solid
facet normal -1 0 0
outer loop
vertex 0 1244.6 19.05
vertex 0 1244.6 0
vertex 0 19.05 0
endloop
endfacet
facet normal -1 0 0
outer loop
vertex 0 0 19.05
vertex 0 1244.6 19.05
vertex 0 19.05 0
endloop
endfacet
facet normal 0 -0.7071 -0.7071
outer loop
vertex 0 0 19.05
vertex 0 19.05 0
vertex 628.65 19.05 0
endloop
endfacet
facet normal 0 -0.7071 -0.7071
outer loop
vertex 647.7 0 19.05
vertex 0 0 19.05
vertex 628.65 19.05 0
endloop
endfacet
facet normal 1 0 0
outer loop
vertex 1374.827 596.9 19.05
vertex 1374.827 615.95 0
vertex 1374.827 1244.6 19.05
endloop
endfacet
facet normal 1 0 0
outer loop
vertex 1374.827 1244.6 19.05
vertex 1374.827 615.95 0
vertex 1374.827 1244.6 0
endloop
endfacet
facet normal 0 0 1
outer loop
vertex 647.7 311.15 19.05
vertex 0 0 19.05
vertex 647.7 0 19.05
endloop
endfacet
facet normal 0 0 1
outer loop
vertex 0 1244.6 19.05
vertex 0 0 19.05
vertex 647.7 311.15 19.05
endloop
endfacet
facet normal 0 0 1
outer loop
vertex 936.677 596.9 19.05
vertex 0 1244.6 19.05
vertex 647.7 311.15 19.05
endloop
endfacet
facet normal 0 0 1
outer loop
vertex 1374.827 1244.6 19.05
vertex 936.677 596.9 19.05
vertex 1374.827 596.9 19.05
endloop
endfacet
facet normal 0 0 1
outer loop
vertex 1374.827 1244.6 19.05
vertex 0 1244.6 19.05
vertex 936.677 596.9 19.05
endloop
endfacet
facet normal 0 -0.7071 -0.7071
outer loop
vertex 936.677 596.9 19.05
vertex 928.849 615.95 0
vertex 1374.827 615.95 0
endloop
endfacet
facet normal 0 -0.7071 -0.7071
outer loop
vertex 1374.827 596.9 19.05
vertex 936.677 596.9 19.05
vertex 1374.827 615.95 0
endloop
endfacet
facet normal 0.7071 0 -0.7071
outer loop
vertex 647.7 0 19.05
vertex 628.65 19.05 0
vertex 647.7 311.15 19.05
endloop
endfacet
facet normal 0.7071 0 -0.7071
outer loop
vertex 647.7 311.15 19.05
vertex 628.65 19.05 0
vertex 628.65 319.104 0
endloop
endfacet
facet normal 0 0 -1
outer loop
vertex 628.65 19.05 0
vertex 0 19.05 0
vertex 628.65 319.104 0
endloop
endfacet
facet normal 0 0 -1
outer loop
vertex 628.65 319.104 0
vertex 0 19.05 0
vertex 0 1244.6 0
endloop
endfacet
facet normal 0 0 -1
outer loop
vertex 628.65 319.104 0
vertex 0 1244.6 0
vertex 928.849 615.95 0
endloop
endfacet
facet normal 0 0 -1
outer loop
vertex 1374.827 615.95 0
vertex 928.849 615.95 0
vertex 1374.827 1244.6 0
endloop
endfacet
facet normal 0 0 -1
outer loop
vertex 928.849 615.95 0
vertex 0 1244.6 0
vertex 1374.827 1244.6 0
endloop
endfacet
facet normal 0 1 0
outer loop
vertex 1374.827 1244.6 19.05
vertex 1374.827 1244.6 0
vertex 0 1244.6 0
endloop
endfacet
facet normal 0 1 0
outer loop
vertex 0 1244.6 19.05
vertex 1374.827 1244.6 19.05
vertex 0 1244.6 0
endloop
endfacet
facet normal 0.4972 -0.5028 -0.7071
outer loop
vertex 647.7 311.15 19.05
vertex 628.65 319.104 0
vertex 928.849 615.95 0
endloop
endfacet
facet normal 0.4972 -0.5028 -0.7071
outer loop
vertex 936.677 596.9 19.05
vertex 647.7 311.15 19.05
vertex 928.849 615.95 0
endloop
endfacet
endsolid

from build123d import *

# Parameters (mm, degrees)
F1_DEPTH = 19.05
F2_SIZE  = 19.04999


# Not quite as in the source:
# - a fillet or chamfer is up to 0.001 mm smaller than in the source, because OpenCascade refuses the exact size


with BuildPart() as f1:
    # F0 (on Top) → F1 (new body)
    with BuildSketch(Plane.XY):
        Polygon((0, 1244.6), (0, 0), (647.7, 0), (647.7, 311.15), (936.6773304258, 596.9), (1374.8273304258, 596.9), (1374.8273304258, 1244.6), align=None)
    extrude(amount=F1_DEPTH)

    # F2 (size 19.05 in the source; OpenCascade refuses exactly that, so slightly less here)
    f2_edges = [f1.edges().sort_by_distance(p)[0] for p in [
        (647.7, 155.575, 0),
        (792.188665, 454.025, 0),
        (1155.75233, 596.9, 0),
        (323.85, 0, 0),
    ]]
    chamfer(f2_edges, length=F2_SIZE)


solid = f1.part
